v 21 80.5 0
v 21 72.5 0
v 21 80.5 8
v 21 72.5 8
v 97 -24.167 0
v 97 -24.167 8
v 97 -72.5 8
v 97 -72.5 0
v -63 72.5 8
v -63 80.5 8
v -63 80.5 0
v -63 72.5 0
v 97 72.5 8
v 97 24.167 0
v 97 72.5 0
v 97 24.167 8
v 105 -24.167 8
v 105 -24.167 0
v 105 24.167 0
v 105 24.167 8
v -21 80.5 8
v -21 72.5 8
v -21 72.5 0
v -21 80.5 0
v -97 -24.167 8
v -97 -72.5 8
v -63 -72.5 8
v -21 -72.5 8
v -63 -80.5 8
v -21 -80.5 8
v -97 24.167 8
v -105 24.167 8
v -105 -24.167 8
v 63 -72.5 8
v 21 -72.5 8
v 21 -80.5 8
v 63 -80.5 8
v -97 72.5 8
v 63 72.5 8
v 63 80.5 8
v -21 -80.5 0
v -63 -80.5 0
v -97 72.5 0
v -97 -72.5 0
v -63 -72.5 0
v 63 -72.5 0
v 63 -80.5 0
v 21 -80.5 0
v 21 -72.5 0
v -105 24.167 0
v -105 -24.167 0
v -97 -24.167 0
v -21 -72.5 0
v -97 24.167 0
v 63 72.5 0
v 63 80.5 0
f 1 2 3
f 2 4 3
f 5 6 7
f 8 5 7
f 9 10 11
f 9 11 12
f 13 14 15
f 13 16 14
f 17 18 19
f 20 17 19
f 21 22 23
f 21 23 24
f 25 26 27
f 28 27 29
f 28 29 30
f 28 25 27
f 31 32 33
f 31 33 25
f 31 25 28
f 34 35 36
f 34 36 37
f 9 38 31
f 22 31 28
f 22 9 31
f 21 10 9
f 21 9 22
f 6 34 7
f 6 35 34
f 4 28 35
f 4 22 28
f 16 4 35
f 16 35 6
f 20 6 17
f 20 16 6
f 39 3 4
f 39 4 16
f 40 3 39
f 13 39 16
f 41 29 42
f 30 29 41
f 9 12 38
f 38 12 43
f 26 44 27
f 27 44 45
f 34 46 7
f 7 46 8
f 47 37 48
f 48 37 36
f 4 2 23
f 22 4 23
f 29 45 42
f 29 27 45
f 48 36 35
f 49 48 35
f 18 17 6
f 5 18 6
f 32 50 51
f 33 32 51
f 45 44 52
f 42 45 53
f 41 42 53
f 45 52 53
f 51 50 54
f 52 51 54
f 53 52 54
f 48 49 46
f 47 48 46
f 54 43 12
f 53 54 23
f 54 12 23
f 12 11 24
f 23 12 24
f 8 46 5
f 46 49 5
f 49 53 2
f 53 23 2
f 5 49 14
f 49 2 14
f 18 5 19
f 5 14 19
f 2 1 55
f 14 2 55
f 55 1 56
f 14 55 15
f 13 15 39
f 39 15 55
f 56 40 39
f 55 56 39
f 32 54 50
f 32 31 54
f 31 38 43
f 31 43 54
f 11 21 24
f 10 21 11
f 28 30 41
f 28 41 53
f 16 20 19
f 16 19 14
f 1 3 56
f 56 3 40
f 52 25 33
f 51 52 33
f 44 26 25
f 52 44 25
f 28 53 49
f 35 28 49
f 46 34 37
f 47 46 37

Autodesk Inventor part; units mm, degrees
ref_plane "YZ Plane" through (0, 0, 0) normal (1, 0, 0) x (0, 1, 0)
ref_plane "XZ Plane" through (0, 0, 0) normal (0, 1, 0) x (-1, 0, 0)
ref_plane "XY Plane" through (0, 0, 0) normal (0, 0, 1) x (1, 0, 0)
sketch "Sketch2" plane through (0, 0, 0) normal (0, 0, 1) x (1, 0, 0)
  line L0 (-105, -72.5) -> (105, -72.5)
  line L1 (105, -72.5) -> (105, 72.5)
  line L2 (105, 72.5) -> (-105, 72.5)
  line L3 (-105, 72.5) -> (-105, -72.5)
  line L4 (-105, -72.5) -> (105, 72.5) construction
  line L5 (105, -72.5) -> (-105, 72.5) construction
  point P0 (0, 0)
  dimension "d11" = 145
  dimension "d12" = 210
extrude "Extrusion2" add sketch "Sketch2" along normal blind 8
sketch "Sketch3" plane through (0, 0, 8) normal (0, 0, 1) x (1, 0, 0)
  line L0 (105, 72.5) -> (-105, 72.5) projected
  line L1 (-63, 72.5) -> (-21, 72.5)
  line L2 (-21, 72.5) -> (-21, 80.5)
  line L3 (-21, 80.5) -> (-63, 80.5)
  line L4 (-63, 80.5) -> (-63, 72.5)
  line L5 (63, 72.5) -> (21, 72.5)
  line L6 (21, 72.5) -> (21, 80.5)
  line L7 (21, 80.5) -> (63, 80.5)
  line L8 (63, 80.5) -> (63, 72.5)
  line L9 (-21, 80.5) -> (21, 80.5) construction
  line L10 (63, 80.5) -> (105, 80.5) construction
  line L11 (-63, 80.5) -> (-105, 80.5) construction
  point P0 (0, 0)
  dimension "d15" = 8
extrude "Extrusion3" add sketch "Sketch3" against normal blind 8
mirror "Mirror1" about plane through (0, 0, 0) normal (0, 1, 0) of "Extrusion3"
sketch "Sketch4" plane through (0, 0, 8) normal (0, 0, 1) x (1, 0, 0)
  line L0 (-105, 72.5) -> (-105, -72.5) projected
  line L1 (-105, -72.5) -> (-97, -72.5)
  line L2 (-97, -72.5) -> (-97, -24.1667)
  line L3 (-97, -24.1667) -> (-105, -24.1667)
  line L4 (-105, -24.1667) -> (-105, -72.5)
  line L5 (-105, 72.5) -> (-97, 72.5)
  line L6 (-97, 72.5) -> (-97, 24.1667)
  line L7 (-97, 24.1667) -> (-105, 24.1667)
  line L8 (-105, 24.1667) -> (-105, 72.5)
  line L9 (-97, -24.1667) -> (-97, 24.1667) construction
  point P0 (0, 0)
  dimension "d21" = 8
extrude "Extrusion4" cut sketch "Sketch4" against normal blind 8
mirror "Mirror2" about plane through (0, 0, 0) normal (1, 0, 0) of "Extrusion4"
properties part number "M06 - Wall Side 1" material "Wood (Walnut)"
